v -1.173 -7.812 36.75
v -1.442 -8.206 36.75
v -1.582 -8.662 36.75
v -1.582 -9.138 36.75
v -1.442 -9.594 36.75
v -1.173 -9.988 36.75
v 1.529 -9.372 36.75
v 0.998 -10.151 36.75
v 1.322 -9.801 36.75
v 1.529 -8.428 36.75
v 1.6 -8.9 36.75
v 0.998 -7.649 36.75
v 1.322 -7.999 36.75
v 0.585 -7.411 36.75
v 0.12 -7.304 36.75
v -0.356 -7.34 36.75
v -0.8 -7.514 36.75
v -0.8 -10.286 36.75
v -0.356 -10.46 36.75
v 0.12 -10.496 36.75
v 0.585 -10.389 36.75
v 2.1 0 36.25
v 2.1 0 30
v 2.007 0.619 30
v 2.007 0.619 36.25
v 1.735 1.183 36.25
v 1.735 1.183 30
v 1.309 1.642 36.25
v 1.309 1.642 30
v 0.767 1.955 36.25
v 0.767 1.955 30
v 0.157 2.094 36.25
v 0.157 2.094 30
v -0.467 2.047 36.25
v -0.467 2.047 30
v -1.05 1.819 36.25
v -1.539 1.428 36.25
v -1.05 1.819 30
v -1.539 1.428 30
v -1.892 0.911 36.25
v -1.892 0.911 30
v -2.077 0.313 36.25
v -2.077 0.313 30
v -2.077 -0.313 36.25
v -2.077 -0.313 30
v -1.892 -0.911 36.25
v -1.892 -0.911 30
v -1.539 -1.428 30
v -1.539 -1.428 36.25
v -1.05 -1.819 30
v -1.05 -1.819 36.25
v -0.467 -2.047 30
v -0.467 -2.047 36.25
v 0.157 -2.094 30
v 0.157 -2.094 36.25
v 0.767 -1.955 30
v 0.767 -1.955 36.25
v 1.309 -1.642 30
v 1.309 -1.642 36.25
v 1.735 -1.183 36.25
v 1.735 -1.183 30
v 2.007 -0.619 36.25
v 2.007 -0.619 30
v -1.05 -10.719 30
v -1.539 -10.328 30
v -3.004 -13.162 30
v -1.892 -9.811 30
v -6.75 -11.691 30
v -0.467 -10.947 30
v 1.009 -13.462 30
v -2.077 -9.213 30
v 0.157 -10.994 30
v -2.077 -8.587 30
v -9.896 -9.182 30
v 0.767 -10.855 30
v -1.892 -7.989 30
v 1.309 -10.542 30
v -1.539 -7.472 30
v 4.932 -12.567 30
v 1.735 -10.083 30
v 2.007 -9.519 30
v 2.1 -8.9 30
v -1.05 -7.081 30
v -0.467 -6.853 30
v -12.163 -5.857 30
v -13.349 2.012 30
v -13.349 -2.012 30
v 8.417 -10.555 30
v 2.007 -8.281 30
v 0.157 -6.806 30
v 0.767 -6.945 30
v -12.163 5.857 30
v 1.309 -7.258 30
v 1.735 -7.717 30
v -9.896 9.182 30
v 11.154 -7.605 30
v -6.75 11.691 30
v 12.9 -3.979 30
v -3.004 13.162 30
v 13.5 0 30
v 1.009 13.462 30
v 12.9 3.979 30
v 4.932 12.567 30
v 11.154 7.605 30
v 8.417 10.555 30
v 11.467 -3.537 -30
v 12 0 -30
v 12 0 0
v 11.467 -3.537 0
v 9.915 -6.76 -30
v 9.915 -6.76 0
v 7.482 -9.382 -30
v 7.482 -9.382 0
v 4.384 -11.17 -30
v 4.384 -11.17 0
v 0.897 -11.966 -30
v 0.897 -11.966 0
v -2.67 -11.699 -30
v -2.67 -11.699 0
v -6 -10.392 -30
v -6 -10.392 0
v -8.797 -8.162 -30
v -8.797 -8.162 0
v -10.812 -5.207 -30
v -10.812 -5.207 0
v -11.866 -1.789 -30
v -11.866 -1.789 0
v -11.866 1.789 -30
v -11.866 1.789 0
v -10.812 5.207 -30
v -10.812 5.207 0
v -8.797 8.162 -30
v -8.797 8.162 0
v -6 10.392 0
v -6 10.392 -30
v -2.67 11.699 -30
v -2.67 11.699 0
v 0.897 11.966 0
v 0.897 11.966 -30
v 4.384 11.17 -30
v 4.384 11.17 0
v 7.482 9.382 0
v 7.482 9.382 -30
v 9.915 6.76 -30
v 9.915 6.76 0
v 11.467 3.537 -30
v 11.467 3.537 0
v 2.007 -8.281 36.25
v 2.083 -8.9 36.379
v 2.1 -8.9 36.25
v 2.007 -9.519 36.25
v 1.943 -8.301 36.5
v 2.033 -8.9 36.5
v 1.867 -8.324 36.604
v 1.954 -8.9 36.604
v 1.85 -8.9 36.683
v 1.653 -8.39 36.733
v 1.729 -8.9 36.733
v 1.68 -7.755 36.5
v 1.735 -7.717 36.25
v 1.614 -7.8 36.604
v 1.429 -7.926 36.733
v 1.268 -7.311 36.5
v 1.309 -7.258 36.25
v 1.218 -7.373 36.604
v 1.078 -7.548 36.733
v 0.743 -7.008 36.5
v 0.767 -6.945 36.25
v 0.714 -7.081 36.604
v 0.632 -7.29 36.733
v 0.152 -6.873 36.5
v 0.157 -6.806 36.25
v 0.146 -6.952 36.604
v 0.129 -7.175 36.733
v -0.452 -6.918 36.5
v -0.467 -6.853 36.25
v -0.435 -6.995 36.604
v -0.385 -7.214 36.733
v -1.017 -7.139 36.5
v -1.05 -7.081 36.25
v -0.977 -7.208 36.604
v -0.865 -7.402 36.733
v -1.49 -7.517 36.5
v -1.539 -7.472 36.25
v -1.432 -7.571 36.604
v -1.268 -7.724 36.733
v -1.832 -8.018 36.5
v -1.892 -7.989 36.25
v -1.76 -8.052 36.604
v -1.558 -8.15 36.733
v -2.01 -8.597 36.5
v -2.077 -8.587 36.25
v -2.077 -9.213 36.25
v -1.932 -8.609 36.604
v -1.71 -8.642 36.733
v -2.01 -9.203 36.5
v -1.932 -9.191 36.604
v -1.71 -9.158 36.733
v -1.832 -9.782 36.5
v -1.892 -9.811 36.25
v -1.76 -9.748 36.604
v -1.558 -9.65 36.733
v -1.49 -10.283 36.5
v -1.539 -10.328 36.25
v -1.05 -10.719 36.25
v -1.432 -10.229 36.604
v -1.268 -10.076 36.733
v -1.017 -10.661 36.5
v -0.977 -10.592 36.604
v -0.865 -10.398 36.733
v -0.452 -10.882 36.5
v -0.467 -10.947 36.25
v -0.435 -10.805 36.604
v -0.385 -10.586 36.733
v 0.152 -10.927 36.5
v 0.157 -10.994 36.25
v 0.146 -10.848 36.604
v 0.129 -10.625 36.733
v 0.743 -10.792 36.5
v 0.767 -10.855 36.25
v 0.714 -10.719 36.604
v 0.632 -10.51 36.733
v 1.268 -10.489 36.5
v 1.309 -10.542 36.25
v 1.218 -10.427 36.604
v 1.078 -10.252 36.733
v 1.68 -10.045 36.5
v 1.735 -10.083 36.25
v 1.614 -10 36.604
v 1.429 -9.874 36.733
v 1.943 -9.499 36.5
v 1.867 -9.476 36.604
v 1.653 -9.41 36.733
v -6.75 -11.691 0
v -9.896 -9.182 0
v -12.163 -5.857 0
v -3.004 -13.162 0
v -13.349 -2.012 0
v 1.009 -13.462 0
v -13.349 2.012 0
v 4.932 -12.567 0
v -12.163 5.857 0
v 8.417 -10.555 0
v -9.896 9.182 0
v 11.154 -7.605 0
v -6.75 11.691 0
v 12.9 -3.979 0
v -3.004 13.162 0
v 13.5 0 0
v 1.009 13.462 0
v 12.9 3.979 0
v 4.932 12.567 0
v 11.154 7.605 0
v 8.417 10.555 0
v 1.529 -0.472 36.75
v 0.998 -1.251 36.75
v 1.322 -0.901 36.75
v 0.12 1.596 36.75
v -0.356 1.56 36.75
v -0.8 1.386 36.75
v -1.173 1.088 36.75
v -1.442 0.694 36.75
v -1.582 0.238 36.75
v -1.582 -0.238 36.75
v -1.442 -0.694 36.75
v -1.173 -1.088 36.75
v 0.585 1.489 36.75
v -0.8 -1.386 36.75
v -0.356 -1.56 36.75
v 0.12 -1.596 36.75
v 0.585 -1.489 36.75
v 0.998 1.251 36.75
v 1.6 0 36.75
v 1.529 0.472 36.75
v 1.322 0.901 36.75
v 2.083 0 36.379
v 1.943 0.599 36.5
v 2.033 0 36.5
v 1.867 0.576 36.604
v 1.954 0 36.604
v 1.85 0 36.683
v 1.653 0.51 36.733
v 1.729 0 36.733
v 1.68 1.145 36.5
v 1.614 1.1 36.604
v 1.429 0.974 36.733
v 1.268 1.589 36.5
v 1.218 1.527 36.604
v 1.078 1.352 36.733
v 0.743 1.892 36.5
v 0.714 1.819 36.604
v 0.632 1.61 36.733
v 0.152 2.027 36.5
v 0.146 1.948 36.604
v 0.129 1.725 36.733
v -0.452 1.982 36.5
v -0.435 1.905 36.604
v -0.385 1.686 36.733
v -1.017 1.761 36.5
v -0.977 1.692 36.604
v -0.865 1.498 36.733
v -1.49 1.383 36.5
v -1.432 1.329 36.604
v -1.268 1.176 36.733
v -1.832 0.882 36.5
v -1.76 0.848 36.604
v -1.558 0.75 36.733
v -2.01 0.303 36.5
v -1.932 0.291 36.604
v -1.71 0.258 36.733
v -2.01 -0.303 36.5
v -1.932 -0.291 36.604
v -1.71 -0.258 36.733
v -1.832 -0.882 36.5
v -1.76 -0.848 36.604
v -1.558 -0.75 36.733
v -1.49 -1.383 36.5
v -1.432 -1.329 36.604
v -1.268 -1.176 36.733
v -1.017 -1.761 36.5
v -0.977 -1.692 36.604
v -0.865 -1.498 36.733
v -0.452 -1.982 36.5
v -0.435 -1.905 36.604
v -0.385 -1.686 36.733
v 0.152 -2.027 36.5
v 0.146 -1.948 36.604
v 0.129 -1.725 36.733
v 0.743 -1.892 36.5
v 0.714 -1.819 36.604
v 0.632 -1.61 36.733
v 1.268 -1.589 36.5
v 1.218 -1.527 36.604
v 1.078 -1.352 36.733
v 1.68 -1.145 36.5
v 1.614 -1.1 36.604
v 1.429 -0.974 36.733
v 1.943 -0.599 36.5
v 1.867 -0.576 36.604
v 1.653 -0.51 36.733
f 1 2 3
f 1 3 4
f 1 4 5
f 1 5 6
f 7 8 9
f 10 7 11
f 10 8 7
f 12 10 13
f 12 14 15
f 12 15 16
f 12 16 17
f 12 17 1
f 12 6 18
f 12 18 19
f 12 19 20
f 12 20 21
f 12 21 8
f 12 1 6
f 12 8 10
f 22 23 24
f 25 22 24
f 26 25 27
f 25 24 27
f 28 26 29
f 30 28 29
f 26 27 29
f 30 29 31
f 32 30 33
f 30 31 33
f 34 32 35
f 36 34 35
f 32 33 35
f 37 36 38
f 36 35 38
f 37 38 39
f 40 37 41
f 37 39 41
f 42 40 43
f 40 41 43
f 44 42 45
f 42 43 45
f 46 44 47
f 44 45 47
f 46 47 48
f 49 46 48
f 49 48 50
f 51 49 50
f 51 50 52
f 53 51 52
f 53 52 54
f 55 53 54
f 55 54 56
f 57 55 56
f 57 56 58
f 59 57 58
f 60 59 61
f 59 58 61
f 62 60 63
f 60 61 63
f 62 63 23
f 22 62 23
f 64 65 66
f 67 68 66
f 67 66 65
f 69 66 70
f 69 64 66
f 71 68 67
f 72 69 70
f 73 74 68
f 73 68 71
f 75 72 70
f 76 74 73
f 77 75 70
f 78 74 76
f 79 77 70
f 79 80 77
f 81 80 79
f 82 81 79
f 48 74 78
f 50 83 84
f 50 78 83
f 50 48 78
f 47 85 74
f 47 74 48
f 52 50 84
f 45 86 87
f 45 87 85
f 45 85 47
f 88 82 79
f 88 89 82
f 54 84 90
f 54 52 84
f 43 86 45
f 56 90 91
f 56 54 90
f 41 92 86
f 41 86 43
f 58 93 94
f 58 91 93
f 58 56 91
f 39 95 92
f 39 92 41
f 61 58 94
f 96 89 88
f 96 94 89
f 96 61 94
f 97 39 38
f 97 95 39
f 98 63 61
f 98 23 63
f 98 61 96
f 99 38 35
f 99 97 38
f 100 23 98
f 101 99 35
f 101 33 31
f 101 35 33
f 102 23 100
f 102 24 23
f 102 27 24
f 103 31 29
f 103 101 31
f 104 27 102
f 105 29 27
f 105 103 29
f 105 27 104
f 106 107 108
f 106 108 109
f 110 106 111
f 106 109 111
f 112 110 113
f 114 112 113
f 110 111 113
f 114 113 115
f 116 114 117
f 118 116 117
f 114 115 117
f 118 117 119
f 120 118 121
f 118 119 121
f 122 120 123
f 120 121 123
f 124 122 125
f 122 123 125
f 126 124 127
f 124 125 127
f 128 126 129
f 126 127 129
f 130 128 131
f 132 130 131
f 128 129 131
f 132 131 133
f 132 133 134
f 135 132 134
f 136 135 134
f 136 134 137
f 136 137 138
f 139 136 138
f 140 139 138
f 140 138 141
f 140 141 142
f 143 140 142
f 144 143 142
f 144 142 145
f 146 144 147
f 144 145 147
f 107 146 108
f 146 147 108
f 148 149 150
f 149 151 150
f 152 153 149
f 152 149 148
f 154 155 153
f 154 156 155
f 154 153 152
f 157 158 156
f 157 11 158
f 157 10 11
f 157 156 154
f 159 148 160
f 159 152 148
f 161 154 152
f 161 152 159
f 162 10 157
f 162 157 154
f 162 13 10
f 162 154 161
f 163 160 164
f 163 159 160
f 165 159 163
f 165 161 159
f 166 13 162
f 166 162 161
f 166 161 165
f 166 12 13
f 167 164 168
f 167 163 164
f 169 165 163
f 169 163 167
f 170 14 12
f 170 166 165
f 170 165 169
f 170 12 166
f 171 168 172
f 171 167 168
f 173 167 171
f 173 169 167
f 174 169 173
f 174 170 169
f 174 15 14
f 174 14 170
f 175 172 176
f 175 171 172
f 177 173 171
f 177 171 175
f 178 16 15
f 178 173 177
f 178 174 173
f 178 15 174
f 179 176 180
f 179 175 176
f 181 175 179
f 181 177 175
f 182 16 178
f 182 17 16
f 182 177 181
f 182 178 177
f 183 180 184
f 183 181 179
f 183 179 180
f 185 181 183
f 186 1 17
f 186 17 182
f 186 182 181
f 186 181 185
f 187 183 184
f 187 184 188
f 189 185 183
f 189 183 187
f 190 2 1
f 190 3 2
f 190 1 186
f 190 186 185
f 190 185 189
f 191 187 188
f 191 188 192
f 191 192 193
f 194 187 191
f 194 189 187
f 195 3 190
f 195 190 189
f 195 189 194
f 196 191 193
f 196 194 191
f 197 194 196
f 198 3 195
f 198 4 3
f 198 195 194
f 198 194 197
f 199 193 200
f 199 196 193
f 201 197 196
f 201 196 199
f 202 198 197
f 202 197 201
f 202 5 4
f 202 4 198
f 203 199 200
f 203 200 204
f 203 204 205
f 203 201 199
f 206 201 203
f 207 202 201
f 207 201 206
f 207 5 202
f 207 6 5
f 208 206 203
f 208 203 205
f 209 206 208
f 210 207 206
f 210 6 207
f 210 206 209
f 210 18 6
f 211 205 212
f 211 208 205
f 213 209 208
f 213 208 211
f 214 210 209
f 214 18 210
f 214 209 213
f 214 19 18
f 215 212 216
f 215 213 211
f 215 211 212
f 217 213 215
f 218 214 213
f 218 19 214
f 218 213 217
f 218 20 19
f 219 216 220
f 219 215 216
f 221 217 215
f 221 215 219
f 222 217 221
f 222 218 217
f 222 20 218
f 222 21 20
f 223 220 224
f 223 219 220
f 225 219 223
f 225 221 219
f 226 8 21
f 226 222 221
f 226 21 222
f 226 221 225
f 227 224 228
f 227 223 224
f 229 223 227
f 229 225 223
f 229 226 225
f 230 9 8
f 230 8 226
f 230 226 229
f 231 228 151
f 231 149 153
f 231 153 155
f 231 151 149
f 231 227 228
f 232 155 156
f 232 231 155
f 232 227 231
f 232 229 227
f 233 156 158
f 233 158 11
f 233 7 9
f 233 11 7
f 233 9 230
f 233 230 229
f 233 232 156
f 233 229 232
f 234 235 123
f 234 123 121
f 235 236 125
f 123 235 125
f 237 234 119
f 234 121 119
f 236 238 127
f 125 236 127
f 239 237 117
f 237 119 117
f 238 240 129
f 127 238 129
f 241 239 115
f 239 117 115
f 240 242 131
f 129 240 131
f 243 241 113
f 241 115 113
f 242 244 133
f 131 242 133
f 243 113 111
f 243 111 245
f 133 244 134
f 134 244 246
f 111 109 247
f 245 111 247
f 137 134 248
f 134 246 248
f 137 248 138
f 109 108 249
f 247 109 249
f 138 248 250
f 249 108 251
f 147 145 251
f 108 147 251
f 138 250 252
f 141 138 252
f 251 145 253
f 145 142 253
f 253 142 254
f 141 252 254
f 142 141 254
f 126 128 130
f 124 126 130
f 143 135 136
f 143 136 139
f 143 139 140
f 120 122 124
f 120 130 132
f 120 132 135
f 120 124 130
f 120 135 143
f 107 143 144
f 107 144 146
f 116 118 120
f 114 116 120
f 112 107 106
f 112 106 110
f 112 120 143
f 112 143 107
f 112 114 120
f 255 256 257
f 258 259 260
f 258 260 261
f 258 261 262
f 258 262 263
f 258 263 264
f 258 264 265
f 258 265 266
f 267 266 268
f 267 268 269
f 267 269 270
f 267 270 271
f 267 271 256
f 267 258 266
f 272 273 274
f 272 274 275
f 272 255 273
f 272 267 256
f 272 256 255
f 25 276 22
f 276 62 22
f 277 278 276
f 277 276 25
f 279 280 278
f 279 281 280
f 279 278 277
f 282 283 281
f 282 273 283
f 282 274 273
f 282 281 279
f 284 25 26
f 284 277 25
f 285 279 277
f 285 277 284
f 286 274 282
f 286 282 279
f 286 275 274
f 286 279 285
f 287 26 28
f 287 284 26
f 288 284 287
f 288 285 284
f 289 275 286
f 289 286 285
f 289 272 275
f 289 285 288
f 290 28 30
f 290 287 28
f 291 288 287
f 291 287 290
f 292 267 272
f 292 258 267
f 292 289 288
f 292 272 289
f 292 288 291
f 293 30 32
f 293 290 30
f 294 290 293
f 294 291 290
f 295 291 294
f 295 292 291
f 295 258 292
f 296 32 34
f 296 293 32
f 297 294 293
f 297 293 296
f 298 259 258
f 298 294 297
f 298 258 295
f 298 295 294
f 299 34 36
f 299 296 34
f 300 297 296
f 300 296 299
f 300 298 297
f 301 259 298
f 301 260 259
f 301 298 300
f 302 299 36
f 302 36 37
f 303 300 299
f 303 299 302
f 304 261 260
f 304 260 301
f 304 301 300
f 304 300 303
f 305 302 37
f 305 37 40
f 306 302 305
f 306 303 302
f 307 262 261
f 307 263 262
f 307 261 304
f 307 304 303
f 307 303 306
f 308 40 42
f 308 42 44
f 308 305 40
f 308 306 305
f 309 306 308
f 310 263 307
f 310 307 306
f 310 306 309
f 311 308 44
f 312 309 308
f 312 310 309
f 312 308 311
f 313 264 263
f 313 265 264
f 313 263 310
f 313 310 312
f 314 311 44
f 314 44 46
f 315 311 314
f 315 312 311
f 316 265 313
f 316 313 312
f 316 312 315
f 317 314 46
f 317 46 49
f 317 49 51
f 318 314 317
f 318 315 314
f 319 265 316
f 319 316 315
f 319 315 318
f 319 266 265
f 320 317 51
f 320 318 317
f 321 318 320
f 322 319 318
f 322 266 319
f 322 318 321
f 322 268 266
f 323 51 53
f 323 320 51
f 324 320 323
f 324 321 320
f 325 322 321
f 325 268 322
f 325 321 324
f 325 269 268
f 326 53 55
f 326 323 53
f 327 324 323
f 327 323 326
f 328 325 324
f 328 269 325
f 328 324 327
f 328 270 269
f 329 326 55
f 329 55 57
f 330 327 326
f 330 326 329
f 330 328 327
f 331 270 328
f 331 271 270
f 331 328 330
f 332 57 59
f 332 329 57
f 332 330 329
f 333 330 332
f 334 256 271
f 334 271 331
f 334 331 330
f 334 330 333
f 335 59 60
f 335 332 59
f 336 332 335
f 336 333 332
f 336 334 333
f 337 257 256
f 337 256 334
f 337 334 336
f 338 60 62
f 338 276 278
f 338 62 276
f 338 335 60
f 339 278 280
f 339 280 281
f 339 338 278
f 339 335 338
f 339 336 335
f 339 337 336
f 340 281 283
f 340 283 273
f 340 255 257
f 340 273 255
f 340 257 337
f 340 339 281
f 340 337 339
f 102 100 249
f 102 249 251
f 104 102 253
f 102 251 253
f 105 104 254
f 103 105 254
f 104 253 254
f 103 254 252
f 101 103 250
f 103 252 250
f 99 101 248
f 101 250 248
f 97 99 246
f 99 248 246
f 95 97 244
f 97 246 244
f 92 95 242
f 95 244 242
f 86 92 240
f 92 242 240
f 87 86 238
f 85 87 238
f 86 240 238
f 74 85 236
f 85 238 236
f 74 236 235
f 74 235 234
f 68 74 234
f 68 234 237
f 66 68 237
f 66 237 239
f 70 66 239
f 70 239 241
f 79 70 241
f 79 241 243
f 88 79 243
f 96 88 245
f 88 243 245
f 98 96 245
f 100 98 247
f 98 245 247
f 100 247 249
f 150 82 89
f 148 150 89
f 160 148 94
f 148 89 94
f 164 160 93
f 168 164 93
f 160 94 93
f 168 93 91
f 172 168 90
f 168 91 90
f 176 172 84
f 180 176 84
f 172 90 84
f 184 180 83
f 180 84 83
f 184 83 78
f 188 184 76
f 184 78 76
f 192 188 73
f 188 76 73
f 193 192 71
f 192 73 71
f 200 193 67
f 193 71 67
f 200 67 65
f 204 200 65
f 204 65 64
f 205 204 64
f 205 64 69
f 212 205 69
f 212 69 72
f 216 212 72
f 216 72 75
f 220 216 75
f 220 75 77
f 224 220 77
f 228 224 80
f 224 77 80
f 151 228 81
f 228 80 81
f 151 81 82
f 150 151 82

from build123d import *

# Parameters (mm, degrees)
SKETCH_R     = 13.5
PAD_DEPTH    = 30
SKETCH001_R  = 12
PAD001_DEPTH = 30
SKETCH002_R  = 2.1
PAD002_DEPTH = 6.75
FILLET_R     = 0.5
FILLET001_R  = 0.5


with BuildPart() as part:
    # Sketch → Pad (new body)
    with BuildSketch(Plane.XY):
        Circle(SKETCH_R)
    extrude(amount=PAD_DEPTH)

    # Sketch001 (on Face2 of Pad) → Pad001 (join)
    with BuildSketch(Plane(origin=(0, 0, 0), x_dir=(1, 0, 0), z_dir=(0, 0, -1))):
        Circle(SKETCH001_R)
    extrude(amount=PAD001_DEPTH)

    # Sketch002 (on Face3 of Pad001) → Pad002 (join)
    with BuildSketch(Plane.XY.offset(30)):
        Circle(SKETCH002_R)
        with Locations((0, -8.9)):
            Circle(SKETCH002_R)
    extrude(amount=PAD002_DEPTH)

    # Fillet
    fillet_edges = [part.edges().sort_by_distance(p)[0] for p in [
        (-2.1, 0, 36.75),
    ]]
    fillet(fillet_edges, radius=FILLET_R)

    # Fillet001
    fillet001_edges = [part.edges().sort_by_distance(p)[0] for p in [
        (-2.1, -8.9, 36.75),
    ]]
    fillet(fillet001_edges, radius=FILLET001_R)


solid = part.part
